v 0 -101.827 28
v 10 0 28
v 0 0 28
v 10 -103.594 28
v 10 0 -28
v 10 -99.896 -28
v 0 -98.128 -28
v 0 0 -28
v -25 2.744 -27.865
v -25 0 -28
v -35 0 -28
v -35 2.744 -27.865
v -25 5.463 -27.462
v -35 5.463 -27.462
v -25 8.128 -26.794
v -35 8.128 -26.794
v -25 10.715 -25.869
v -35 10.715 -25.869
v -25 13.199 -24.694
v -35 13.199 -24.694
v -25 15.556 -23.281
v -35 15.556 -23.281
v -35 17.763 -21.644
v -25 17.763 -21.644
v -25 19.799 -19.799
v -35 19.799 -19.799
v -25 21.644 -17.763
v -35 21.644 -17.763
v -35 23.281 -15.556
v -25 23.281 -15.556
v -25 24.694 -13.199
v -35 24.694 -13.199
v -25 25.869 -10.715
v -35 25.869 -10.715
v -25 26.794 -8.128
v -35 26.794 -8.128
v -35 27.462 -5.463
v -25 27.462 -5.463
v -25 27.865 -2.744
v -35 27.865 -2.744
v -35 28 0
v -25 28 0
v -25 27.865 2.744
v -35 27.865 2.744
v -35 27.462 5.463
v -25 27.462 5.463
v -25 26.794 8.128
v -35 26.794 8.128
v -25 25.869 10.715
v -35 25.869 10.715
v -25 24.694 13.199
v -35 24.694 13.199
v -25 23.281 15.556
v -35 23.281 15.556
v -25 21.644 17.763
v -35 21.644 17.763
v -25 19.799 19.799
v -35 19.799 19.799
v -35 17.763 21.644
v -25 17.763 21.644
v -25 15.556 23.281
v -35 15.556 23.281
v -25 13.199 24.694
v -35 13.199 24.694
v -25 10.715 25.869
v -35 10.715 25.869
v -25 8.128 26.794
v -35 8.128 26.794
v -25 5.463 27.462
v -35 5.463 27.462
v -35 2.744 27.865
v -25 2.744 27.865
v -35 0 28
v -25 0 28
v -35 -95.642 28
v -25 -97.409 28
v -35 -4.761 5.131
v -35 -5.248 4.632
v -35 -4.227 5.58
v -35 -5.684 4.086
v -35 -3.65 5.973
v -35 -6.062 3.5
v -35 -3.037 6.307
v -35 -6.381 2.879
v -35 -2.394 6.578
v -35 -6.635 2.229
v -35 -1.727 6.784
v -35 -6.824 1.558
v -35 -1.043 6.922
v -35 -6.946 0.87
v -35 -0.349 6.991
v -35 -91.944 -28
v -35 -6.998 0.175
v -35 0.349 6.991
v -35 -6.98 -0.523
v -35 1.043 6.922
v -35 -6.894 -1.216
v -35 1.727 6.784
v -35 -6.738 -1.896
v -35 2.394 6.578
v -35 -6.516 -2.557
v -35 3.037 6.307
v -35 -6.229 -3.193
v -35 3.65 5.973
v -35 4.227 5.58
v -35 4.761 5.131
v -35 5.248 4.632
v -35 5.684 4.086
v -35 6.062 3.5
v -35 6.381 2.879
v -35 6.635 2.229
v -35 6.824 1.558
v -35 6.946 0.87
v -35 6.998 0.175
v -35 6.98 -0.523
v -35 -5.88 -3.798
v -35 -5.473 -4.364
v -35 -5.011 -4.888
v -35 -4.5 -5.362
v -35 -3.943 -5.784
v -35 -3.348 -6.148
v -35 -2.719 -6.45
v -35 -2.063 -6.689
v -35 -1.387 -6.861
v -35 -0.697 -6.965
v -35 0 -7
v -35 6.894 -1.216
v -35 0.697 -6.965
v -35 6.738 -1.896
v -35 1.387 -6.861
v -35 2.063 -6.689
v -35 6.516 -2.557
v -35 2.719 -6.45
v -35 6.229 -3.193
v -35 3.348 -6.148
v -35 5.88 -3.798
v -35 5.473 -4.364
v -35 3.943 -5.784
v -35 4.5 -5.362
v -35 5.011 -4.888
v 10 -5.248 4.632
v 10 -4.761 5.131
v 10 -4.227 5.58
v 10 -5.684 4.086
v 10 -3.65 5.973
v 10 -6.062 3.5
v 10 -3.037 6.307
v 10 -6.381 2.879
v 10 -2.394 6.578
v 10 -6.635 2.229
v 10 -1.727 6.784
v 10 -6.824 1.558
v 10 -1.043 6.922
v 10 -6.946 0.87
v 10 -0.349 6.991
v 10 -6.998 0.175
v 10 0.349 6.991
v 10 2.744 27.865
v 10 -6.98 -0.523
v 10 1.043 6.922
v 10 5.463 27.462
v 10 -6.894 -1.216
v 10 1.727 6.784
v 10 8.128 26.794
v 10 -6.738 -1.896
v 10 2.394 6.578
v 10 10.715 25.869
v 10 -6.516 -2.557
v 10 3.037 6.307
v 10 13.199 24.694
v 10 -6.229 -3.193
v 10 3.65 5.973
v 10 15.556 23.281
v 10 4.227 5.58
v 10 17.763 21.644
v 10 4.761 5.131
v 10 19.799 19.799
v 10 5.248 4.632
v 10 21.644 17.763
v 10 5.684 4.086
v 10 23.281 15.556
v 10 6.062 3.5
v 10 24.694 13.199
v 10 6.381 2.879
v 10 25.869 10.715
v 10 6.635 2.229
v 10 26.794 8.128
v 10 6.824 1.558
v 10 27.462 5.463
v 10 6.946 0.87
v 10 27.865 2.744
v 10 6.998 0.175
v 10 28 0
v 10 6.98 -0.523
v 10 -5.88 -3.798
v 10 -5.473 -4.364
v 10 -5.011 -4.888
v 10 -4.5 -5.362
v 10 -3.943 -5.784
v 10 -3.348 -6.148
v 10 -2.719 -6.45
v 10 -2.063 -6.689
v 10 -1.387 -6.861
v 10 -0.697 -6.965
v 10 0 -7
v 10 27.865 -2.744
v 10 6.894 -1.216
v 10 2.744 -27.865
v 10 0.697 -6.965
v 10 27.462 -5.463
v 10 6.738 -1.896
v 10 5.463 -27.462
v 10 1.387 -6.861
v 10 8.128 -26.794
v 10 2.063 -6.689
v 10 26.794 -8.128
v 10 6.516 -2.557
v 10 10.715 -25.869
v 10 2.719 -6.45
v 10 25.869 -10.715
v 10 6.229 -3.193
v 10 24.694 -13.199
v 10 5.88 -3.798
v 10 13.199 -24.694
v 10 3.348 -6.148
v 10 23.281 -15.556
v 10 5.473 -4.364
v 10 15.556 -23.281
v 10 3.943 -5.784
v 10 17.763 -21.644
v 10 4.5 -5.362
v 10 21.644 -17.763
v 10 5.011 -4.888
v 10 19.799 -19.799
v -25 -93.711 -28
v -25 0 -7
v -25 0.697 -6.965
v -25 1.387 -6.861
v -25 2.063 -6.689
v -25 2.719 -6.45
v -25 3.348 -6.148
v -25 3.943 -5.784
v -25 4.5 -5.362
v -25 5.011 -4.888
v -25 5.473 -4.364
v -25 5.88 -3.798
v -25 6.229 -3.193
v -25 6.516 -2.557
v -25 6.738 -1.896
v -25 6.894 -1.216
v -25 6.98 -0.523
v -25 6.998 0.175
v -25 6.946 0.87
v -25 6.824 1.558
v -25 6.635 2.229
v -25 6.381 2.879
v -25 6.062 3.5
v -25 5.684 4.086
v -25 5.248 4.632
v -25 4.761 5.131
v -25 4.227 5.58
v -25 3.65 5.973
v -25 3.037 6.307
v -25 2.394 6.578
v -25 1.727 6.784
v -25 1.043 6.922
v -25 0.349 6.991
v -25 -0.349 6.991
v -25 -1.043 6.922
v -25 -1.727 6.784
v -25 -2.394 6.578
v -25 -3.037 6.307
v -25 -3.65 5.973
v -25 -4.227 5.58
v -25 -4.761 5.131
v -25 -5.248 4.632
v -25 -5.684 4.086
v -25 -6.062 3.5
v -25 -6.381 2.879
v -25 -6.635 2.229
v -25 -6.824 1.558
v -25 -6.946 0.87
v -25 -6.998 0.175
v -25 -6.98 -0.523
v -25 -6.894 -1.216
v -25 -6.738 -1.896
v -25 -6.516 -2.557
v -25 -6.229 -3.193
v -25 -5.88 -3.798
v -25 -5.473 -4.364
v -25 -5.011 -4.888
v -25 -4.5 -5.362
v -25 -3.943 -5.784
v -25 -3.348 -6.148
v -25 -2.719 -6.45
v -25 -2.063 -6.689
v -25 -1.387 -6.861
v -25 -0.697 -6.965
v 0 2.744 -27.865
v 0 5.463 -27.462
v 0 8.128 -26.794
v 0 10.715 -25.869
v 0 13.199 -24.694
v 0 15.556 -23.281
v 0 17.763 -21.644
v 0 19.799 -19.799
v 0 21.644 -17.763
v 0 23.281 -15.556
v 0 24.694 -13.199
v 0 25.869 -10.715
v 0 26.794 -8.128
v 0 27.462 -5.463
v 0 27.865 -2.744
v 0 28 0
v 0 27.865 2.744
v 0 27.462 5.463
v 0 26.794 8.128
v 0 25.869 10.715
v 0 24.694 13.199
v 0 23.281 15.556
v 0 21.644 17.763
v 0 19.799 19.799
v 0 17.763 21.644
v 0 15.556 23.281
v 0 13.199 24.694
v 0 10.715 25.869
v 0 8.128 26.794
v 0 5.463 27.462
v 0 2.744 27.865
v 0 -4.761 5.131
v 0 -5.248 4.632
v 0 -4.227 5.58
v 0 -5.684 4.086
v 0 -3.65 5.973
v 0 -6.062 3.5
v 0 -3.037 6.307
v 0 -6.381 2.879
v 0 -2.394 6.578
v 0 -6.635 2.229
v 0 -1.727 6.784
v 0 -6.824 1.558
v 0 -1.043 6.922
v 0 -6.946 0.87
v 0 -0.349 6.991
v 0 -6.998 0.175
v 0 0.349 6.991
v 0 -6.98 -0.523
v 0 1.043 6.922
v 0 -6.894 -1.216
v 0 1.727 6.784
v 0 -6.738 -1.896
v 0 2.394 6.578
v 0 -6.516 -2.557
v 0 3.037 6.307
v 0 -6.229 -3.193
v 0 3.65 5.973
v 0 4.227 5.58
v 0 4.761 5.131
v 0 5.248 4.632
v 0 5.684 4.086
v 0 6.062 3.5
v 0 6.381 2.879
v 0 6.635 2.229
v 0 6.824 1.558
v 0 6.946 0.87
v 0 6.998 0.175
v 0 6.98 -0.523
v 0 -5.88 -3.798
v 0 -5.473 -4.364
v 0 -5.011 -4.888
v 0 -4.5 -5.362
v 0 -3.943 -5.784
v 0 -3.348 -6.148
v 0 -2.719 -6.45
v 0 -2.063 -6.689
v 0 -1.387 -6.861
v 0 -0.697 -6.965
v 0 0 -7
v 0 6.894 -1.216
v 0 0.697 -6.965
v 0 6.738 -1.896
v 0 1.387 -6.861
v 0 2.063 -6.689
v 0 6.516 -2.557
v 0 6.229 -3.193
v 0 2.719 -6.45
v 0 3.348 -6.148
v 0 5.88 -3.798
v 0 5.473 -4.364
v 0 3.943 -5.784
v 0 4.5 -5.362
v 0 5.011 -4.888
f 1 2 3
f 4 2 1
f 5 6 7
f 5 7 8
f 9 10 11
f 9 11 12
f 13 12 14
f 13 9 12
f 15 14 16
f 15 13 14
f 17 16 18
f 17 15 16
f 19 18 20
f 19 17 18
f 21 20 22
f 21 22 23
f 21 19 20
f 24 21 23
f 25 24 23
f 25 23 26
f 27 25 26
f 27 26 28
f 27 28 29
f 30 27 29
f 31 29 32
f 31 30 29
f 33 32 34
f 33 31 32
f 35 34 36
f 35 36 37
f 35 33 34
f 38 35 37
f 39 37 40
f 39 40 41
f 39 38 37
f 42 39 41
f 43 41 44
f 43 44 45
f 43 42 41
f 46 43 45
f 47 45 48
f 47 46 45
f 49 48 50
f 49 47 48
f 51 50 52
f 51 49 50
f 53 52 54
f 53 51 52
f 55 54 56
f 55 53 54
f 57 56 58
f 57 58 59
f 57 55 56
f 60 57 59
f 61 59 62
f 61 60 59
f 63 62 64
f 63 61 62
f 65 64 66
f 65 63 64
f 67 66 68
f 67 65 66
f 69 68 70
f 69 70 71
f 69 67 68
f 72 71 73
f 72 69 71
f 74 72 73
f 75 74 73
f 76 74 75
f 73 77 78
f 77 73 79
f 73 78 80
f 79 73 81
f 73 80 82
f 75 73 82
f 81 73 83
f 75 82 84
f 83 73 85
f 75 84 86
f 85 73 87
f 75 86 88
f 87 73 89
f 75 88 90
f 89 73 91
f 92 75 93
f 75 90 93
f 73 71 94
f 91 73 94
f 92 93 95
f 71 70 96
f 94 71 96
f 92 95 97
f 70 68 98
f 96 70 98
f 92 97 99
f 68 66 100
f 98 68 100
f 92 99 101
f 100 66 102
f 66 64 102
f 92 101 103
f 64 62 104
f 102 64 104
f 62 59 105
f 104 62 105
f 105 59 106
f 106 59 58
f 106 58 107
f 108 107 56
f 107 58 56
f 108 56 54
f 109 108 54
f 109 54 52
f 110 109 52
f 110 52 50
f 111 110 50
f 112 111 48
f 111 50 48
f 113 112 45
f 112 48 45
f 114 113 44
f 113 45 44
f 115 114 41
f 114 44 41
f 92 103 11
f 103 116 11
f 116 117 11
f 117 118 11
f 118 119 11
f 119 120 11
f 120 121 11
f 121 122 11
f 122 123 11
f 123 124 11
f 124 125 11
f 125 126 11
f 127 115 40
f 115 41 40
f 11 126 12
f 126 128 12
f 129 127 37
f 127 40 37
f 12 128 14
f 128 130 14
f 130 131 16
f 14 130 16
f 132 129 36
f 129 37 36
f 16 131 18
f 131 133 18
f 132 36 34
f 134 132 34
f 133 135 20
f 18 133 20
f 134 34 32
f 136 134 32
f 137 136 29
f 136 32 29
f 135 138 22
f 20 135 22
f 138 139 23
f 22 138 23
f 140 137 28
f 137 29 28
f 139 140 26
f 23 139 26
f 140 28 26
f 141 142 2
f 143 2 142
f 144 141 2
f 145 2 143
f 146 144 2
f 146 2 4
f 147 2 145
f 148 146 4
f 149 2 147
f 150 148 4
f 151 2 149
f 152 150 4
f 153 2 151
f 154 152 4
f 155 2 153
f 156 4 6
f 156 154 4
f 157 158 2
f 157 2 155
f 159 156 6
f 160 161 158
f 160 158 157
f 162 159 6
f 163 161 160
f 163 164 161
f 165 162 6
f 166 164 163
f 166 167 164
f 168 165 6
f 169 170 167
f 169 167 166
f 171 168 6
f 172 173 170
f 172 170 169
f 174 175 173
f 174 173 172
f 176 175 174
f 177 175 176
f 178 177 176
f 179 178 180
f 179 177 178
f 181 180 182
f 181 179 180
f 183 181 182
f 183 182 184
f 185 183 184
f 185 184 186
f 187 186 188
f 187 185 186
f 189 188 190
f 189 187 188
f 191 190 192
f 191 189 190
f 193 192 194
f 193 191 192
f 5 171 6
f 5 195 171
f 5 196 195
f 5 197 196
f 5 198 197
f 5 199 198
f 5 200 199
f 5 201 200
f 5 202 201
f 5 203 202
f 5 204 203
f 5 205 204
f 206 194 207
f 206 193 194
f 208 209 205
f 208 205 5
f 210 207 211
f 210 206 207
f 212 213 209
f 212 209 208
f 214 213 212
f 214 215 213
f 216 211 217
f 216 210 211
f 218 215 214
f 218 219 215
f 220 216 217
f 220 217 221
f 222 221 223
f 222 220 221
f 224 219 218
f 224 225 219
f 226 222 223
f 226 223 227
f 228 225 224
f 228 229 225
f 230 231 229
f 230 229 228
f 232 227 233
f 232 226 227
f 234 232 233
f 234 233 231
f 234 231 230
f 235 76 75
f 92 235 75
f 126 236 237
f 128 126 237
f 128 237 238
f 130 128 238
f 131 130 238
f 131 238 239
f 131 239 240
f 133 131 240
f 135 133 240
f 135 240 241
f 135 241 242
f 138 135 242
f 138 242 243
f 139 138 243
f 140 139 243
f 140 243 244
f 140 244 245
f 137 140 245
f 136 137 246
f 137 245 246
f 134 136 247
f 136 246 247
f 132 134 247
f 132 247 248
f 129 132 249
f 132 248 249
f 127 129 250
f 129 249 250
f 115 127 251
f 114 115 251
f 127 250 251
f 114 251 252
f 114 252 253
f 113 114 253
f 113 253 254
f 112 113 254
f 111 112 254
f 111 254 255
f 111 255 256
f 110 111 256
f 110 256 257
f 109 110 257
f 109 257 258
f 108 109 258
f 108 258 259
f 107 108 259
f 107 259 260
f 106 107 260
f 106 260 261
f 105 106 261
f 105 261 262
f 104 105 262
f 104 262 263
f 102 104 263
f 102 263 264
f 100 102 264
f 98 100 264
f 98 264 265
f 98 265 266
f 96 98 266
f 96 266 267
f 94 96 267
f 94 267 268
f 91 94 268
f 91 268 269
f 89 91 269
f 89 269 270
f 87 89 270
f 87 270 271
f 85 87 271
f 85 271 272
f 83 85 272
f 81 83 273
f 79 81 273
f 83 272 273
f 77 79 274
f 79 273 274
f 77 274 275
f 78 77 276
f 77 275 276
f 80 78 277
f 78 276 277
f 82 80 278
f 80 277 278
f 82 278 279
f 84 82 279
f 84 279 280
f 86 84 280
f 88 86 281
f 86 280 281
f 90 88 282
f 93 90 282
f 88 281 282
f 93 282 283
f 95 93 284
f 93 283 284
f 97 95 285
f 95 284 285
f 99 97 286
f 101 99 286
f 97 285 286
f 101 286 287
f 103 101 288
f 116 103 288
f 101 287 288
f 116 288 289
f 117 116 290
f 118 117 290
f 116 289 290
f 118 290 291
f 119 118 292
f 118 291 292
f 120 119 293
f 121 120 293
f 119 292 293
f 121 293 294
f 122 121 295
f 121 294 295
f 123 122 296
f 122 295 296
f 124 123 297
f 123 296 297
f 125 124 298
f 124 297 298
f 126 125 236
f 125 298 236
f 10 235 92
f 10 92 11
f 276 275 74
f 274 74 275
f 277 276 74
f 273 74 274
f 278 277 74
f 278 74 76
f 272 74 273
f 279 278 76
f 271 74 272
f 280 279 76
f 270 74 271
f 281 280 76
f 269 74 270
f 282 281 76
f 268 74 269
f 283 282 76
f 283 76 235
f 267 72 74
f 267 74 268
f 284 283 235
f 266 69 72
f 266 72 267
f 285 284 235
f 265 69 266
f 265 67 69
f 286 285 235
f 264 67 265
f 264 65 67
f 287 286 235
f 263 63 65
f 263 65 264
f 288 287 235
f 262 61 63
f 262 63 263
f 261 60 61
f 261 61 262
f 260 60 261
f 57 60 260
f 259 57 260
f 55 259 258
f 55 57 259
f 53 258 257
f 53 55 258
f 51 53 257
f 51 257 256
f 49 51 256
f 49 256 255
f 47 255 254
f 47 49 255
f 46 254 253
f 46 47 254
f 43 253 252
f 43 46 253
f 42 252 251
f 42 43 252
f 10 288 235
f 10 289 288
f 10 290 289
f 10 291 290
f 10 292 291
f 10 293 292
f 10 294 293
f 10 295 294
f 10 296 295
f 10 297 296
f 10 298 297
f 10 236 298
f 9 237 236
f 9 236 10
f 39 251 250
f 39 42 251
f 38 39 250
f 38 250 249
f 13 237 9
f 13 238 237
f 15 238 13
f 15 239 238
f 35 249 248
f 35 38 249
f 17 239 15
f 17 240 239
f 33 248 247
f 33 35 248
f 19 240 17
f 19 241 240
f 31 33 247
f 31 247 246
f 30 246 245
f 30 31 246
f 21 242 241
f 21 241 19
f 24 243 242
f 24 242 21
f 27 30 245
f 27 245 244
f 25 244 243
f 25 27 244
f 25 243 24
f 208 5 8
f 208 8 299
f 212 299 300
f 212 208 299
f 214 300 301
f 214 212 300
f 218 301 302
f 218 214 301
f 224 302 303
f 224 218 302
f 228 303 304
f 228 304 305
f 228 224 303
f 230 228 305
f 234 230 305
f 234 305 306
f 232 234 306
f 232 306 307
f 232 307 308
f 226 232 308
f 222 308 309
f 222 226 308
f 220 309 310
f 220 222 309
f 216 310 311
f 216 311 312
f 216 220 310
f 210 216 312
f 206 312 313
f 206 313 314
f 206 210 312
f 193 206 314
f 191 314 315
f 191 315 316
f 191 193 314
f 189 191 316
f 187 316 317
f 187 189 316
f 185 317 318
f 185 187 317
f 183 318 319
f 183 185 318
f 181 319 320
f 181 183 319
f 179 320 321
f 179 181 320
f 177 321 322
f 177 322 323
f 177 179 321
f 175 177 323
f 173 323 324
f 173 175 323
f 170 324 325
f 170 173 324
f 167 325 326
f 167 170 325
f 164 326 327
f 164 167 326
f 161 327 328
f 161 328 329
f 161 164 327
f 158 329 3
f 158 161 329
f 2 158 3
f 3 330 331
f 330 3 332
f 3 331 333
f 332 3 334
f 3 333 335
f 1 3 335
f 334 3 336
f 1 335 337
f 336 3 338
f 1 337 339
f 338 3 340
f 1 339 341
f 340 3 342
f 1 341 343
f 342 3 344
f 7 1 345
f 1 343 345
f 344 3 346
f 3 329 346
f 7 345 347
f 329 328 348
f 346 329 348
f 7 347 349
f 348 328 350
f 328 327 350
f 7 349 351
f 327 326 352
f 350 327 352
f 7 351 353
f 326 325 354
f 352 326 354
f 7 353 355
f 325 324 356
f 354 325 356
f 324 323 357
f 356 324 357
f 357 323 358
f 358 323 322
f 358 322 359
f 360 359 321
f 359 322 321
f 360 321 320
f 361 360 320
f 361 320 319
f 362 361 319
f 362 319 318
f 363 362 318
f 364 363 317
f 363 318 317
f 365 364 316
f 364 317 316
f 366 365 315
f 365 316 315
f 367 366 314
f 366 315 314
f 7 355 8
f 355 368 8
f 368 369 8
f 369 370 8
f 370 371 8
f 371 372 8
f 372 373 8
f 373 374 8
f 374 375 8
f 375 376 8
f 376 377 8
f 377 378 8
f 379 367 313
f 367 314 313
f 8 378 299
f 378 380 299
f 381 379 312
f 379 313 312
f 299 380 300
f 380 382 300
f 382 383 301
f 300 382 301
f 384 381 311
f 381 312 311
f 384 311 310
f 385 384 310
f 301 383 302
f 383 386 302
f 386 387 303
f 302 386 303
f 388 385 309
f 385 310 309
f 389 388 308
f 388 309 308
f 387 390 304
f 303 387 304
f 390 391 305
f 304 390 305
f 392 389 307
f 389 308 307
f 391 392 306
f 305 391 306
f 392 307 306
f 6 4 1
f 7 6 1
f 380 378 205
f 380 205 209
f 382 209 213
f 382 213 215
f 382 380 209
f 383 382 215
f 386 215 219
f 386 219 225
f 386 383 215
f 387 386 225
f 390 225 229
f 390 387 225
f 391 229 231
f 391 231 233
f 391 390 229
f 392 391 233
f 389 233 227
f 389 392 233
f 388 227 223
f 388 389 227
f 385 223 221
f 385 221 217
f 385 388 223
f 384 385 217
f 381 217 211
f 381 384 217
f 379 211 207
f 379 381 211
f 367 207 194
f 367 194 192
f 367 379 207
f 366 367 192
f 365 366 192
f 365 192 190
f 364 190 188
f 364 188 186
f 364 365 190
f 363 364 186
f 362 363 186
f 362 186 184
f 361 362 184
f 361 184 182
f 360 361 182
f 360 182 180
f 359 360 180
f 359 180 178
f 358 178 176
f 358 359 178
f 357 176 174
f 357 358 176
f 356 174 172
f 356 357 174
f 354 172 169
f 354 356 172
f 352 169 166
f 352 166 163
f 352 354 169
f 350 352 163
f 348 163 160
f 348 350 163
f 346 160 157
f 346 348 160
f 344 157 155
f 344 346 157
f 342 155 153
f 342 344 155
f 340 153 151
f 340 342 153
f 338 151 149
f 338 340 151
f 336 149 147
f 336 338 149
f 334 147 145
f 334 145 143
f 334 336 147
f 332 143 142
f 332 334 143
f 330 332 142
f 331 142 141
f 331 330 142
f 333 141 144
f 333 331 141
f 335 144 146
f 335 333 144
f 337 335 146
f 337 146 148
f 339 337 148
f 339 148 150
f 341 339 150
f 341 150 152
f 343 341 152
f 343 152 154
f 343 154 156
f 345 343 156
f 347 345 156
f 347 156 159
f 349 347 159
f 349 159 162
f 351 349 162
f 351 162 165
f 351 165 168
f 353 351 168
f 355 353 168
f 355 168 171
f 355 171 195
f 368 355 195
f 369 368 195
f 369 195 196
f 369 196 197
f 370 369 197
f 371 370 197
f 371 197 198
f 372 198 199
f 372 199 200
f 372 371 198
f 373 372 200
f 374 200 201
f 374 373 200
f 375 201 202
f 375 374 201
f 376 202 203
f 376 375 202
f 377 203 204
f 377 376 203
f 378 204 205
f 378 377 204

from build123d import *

# Parameters (mm, degrees)
EXTRUDE_1_DEPTH      = 10
EXTRUDE_1_DEPTH_BACK = 35
SKETCH_1_R           = 7
CUT_EXTRUDE_START    = -25
SKETCH_1_2_R         = 7
CUT_EXTRUDE_1_DEPTH  = 25
SKETCH_2_R           = 162.622084324
CUT_EXTRUDE_2_DEPTH  = 168


with BuildPart() as part:
    # 草图1 → 凸台-拉伸1 (new, two sides: drawn at the far end of the back side and taken through both)
    with BuildSketch(Plane(origin=(0, 0, 0), x_dir=(0, 0, -1), z_dir=(1, 0, 0)).offset(-EXTRUDE_1_DEPTH_BACK)):
        with BuildLine():
            Line((-28, 0), (-28, -200))
            Line((-28, -200), (28, -200))
            Line((28, -200), (28, 0))
            ThreePointArc((28, 0), (0, 28), (-28, 0))
        make_face()
        Circle(SKETCH_1_R, mode=Mode.SUBTRACT)
    extrude(amount=EXTRUDE_1_DEPTH + EXTRUDE_1_DEPTH_BACK)

    # 草图1<2> → 切除-拉伸1 (cut)
    with BuildSketch(Plane(origin=(0, 0, 0), x_dir=(0, 0, -1), z_dir=(1, 0, 0)).offset(CUT_EXTRUDE_START)):
        with BuildLine():
            Line((-28, 0), (-28, -200))
            Line((-28, -200), (28, -200))
            Line((28, -200), (28, 0))
            ThreePointArc((28, 0), (0, 28), (-28, 0))
        make_face()
        Circle(SKETCH_1_2_R, mode=Mode.SUBTRACT)
    extrude(amount=CUT_EXTRUDE_1_DEPTH, mode=Mode.SUBTRACT)


with BuildPart() as cut_extrude_1_piece_1:
    # of the separate pieces the step leaves, piece 1, a body of its own (cut_extrude_1_pieces)
    add(part.part.solids().sort_by_distance((10, 0, 28))[0])


with BuildPart() as cut_extrude_1_piece_2:
    # of the separate pieces the step leaves, piece 2, a body of its own (cut_extrude_1_pieces)
    add(part.part.solids().sort_by_distance((-25, 0, 28))[0])


with BuildPart() as cut_extrude_2_tool:
    # 草图2 → 切除-拉伸2 (new body)
    with BuildSketch(Plane(origin=(-17.060033695, -96.541924604, -6.376237343), x_dir=(-0.9498379877166935, 0.18452396761475204, -0.25250485632164077), z_dir=(0.17364817766693202, 0.9826668326704634, 0.06490151278940554))):
        Circle(SKETCH_2_R)
    extrude(amount=-CUT_EXTRUDE_2_DEPTH)


with BuildPart() as cut_extrude_1_piece_1_1:
    add(cut_extrude_1_piece_1.part)

    # 切除-拉伸2: cut by cut_extrude_2_tool
    add(cut_extrude_2_tool.part, mode=Mode.SUBTRACT)


with BuildPart() as cut_extrude_1_piece_2_1:
    add(cut_extrude_1_piece_2.part)

    # 切除-拉伸2: cut by cut_extrude_2_tool
    add(cut_extrude_2_tool.part, mode=Mode.SUBTRACT)


solid = Compound([cut_extrude_1_piece_1_1.part, cut_extrude_1_piece_2_1.part])
